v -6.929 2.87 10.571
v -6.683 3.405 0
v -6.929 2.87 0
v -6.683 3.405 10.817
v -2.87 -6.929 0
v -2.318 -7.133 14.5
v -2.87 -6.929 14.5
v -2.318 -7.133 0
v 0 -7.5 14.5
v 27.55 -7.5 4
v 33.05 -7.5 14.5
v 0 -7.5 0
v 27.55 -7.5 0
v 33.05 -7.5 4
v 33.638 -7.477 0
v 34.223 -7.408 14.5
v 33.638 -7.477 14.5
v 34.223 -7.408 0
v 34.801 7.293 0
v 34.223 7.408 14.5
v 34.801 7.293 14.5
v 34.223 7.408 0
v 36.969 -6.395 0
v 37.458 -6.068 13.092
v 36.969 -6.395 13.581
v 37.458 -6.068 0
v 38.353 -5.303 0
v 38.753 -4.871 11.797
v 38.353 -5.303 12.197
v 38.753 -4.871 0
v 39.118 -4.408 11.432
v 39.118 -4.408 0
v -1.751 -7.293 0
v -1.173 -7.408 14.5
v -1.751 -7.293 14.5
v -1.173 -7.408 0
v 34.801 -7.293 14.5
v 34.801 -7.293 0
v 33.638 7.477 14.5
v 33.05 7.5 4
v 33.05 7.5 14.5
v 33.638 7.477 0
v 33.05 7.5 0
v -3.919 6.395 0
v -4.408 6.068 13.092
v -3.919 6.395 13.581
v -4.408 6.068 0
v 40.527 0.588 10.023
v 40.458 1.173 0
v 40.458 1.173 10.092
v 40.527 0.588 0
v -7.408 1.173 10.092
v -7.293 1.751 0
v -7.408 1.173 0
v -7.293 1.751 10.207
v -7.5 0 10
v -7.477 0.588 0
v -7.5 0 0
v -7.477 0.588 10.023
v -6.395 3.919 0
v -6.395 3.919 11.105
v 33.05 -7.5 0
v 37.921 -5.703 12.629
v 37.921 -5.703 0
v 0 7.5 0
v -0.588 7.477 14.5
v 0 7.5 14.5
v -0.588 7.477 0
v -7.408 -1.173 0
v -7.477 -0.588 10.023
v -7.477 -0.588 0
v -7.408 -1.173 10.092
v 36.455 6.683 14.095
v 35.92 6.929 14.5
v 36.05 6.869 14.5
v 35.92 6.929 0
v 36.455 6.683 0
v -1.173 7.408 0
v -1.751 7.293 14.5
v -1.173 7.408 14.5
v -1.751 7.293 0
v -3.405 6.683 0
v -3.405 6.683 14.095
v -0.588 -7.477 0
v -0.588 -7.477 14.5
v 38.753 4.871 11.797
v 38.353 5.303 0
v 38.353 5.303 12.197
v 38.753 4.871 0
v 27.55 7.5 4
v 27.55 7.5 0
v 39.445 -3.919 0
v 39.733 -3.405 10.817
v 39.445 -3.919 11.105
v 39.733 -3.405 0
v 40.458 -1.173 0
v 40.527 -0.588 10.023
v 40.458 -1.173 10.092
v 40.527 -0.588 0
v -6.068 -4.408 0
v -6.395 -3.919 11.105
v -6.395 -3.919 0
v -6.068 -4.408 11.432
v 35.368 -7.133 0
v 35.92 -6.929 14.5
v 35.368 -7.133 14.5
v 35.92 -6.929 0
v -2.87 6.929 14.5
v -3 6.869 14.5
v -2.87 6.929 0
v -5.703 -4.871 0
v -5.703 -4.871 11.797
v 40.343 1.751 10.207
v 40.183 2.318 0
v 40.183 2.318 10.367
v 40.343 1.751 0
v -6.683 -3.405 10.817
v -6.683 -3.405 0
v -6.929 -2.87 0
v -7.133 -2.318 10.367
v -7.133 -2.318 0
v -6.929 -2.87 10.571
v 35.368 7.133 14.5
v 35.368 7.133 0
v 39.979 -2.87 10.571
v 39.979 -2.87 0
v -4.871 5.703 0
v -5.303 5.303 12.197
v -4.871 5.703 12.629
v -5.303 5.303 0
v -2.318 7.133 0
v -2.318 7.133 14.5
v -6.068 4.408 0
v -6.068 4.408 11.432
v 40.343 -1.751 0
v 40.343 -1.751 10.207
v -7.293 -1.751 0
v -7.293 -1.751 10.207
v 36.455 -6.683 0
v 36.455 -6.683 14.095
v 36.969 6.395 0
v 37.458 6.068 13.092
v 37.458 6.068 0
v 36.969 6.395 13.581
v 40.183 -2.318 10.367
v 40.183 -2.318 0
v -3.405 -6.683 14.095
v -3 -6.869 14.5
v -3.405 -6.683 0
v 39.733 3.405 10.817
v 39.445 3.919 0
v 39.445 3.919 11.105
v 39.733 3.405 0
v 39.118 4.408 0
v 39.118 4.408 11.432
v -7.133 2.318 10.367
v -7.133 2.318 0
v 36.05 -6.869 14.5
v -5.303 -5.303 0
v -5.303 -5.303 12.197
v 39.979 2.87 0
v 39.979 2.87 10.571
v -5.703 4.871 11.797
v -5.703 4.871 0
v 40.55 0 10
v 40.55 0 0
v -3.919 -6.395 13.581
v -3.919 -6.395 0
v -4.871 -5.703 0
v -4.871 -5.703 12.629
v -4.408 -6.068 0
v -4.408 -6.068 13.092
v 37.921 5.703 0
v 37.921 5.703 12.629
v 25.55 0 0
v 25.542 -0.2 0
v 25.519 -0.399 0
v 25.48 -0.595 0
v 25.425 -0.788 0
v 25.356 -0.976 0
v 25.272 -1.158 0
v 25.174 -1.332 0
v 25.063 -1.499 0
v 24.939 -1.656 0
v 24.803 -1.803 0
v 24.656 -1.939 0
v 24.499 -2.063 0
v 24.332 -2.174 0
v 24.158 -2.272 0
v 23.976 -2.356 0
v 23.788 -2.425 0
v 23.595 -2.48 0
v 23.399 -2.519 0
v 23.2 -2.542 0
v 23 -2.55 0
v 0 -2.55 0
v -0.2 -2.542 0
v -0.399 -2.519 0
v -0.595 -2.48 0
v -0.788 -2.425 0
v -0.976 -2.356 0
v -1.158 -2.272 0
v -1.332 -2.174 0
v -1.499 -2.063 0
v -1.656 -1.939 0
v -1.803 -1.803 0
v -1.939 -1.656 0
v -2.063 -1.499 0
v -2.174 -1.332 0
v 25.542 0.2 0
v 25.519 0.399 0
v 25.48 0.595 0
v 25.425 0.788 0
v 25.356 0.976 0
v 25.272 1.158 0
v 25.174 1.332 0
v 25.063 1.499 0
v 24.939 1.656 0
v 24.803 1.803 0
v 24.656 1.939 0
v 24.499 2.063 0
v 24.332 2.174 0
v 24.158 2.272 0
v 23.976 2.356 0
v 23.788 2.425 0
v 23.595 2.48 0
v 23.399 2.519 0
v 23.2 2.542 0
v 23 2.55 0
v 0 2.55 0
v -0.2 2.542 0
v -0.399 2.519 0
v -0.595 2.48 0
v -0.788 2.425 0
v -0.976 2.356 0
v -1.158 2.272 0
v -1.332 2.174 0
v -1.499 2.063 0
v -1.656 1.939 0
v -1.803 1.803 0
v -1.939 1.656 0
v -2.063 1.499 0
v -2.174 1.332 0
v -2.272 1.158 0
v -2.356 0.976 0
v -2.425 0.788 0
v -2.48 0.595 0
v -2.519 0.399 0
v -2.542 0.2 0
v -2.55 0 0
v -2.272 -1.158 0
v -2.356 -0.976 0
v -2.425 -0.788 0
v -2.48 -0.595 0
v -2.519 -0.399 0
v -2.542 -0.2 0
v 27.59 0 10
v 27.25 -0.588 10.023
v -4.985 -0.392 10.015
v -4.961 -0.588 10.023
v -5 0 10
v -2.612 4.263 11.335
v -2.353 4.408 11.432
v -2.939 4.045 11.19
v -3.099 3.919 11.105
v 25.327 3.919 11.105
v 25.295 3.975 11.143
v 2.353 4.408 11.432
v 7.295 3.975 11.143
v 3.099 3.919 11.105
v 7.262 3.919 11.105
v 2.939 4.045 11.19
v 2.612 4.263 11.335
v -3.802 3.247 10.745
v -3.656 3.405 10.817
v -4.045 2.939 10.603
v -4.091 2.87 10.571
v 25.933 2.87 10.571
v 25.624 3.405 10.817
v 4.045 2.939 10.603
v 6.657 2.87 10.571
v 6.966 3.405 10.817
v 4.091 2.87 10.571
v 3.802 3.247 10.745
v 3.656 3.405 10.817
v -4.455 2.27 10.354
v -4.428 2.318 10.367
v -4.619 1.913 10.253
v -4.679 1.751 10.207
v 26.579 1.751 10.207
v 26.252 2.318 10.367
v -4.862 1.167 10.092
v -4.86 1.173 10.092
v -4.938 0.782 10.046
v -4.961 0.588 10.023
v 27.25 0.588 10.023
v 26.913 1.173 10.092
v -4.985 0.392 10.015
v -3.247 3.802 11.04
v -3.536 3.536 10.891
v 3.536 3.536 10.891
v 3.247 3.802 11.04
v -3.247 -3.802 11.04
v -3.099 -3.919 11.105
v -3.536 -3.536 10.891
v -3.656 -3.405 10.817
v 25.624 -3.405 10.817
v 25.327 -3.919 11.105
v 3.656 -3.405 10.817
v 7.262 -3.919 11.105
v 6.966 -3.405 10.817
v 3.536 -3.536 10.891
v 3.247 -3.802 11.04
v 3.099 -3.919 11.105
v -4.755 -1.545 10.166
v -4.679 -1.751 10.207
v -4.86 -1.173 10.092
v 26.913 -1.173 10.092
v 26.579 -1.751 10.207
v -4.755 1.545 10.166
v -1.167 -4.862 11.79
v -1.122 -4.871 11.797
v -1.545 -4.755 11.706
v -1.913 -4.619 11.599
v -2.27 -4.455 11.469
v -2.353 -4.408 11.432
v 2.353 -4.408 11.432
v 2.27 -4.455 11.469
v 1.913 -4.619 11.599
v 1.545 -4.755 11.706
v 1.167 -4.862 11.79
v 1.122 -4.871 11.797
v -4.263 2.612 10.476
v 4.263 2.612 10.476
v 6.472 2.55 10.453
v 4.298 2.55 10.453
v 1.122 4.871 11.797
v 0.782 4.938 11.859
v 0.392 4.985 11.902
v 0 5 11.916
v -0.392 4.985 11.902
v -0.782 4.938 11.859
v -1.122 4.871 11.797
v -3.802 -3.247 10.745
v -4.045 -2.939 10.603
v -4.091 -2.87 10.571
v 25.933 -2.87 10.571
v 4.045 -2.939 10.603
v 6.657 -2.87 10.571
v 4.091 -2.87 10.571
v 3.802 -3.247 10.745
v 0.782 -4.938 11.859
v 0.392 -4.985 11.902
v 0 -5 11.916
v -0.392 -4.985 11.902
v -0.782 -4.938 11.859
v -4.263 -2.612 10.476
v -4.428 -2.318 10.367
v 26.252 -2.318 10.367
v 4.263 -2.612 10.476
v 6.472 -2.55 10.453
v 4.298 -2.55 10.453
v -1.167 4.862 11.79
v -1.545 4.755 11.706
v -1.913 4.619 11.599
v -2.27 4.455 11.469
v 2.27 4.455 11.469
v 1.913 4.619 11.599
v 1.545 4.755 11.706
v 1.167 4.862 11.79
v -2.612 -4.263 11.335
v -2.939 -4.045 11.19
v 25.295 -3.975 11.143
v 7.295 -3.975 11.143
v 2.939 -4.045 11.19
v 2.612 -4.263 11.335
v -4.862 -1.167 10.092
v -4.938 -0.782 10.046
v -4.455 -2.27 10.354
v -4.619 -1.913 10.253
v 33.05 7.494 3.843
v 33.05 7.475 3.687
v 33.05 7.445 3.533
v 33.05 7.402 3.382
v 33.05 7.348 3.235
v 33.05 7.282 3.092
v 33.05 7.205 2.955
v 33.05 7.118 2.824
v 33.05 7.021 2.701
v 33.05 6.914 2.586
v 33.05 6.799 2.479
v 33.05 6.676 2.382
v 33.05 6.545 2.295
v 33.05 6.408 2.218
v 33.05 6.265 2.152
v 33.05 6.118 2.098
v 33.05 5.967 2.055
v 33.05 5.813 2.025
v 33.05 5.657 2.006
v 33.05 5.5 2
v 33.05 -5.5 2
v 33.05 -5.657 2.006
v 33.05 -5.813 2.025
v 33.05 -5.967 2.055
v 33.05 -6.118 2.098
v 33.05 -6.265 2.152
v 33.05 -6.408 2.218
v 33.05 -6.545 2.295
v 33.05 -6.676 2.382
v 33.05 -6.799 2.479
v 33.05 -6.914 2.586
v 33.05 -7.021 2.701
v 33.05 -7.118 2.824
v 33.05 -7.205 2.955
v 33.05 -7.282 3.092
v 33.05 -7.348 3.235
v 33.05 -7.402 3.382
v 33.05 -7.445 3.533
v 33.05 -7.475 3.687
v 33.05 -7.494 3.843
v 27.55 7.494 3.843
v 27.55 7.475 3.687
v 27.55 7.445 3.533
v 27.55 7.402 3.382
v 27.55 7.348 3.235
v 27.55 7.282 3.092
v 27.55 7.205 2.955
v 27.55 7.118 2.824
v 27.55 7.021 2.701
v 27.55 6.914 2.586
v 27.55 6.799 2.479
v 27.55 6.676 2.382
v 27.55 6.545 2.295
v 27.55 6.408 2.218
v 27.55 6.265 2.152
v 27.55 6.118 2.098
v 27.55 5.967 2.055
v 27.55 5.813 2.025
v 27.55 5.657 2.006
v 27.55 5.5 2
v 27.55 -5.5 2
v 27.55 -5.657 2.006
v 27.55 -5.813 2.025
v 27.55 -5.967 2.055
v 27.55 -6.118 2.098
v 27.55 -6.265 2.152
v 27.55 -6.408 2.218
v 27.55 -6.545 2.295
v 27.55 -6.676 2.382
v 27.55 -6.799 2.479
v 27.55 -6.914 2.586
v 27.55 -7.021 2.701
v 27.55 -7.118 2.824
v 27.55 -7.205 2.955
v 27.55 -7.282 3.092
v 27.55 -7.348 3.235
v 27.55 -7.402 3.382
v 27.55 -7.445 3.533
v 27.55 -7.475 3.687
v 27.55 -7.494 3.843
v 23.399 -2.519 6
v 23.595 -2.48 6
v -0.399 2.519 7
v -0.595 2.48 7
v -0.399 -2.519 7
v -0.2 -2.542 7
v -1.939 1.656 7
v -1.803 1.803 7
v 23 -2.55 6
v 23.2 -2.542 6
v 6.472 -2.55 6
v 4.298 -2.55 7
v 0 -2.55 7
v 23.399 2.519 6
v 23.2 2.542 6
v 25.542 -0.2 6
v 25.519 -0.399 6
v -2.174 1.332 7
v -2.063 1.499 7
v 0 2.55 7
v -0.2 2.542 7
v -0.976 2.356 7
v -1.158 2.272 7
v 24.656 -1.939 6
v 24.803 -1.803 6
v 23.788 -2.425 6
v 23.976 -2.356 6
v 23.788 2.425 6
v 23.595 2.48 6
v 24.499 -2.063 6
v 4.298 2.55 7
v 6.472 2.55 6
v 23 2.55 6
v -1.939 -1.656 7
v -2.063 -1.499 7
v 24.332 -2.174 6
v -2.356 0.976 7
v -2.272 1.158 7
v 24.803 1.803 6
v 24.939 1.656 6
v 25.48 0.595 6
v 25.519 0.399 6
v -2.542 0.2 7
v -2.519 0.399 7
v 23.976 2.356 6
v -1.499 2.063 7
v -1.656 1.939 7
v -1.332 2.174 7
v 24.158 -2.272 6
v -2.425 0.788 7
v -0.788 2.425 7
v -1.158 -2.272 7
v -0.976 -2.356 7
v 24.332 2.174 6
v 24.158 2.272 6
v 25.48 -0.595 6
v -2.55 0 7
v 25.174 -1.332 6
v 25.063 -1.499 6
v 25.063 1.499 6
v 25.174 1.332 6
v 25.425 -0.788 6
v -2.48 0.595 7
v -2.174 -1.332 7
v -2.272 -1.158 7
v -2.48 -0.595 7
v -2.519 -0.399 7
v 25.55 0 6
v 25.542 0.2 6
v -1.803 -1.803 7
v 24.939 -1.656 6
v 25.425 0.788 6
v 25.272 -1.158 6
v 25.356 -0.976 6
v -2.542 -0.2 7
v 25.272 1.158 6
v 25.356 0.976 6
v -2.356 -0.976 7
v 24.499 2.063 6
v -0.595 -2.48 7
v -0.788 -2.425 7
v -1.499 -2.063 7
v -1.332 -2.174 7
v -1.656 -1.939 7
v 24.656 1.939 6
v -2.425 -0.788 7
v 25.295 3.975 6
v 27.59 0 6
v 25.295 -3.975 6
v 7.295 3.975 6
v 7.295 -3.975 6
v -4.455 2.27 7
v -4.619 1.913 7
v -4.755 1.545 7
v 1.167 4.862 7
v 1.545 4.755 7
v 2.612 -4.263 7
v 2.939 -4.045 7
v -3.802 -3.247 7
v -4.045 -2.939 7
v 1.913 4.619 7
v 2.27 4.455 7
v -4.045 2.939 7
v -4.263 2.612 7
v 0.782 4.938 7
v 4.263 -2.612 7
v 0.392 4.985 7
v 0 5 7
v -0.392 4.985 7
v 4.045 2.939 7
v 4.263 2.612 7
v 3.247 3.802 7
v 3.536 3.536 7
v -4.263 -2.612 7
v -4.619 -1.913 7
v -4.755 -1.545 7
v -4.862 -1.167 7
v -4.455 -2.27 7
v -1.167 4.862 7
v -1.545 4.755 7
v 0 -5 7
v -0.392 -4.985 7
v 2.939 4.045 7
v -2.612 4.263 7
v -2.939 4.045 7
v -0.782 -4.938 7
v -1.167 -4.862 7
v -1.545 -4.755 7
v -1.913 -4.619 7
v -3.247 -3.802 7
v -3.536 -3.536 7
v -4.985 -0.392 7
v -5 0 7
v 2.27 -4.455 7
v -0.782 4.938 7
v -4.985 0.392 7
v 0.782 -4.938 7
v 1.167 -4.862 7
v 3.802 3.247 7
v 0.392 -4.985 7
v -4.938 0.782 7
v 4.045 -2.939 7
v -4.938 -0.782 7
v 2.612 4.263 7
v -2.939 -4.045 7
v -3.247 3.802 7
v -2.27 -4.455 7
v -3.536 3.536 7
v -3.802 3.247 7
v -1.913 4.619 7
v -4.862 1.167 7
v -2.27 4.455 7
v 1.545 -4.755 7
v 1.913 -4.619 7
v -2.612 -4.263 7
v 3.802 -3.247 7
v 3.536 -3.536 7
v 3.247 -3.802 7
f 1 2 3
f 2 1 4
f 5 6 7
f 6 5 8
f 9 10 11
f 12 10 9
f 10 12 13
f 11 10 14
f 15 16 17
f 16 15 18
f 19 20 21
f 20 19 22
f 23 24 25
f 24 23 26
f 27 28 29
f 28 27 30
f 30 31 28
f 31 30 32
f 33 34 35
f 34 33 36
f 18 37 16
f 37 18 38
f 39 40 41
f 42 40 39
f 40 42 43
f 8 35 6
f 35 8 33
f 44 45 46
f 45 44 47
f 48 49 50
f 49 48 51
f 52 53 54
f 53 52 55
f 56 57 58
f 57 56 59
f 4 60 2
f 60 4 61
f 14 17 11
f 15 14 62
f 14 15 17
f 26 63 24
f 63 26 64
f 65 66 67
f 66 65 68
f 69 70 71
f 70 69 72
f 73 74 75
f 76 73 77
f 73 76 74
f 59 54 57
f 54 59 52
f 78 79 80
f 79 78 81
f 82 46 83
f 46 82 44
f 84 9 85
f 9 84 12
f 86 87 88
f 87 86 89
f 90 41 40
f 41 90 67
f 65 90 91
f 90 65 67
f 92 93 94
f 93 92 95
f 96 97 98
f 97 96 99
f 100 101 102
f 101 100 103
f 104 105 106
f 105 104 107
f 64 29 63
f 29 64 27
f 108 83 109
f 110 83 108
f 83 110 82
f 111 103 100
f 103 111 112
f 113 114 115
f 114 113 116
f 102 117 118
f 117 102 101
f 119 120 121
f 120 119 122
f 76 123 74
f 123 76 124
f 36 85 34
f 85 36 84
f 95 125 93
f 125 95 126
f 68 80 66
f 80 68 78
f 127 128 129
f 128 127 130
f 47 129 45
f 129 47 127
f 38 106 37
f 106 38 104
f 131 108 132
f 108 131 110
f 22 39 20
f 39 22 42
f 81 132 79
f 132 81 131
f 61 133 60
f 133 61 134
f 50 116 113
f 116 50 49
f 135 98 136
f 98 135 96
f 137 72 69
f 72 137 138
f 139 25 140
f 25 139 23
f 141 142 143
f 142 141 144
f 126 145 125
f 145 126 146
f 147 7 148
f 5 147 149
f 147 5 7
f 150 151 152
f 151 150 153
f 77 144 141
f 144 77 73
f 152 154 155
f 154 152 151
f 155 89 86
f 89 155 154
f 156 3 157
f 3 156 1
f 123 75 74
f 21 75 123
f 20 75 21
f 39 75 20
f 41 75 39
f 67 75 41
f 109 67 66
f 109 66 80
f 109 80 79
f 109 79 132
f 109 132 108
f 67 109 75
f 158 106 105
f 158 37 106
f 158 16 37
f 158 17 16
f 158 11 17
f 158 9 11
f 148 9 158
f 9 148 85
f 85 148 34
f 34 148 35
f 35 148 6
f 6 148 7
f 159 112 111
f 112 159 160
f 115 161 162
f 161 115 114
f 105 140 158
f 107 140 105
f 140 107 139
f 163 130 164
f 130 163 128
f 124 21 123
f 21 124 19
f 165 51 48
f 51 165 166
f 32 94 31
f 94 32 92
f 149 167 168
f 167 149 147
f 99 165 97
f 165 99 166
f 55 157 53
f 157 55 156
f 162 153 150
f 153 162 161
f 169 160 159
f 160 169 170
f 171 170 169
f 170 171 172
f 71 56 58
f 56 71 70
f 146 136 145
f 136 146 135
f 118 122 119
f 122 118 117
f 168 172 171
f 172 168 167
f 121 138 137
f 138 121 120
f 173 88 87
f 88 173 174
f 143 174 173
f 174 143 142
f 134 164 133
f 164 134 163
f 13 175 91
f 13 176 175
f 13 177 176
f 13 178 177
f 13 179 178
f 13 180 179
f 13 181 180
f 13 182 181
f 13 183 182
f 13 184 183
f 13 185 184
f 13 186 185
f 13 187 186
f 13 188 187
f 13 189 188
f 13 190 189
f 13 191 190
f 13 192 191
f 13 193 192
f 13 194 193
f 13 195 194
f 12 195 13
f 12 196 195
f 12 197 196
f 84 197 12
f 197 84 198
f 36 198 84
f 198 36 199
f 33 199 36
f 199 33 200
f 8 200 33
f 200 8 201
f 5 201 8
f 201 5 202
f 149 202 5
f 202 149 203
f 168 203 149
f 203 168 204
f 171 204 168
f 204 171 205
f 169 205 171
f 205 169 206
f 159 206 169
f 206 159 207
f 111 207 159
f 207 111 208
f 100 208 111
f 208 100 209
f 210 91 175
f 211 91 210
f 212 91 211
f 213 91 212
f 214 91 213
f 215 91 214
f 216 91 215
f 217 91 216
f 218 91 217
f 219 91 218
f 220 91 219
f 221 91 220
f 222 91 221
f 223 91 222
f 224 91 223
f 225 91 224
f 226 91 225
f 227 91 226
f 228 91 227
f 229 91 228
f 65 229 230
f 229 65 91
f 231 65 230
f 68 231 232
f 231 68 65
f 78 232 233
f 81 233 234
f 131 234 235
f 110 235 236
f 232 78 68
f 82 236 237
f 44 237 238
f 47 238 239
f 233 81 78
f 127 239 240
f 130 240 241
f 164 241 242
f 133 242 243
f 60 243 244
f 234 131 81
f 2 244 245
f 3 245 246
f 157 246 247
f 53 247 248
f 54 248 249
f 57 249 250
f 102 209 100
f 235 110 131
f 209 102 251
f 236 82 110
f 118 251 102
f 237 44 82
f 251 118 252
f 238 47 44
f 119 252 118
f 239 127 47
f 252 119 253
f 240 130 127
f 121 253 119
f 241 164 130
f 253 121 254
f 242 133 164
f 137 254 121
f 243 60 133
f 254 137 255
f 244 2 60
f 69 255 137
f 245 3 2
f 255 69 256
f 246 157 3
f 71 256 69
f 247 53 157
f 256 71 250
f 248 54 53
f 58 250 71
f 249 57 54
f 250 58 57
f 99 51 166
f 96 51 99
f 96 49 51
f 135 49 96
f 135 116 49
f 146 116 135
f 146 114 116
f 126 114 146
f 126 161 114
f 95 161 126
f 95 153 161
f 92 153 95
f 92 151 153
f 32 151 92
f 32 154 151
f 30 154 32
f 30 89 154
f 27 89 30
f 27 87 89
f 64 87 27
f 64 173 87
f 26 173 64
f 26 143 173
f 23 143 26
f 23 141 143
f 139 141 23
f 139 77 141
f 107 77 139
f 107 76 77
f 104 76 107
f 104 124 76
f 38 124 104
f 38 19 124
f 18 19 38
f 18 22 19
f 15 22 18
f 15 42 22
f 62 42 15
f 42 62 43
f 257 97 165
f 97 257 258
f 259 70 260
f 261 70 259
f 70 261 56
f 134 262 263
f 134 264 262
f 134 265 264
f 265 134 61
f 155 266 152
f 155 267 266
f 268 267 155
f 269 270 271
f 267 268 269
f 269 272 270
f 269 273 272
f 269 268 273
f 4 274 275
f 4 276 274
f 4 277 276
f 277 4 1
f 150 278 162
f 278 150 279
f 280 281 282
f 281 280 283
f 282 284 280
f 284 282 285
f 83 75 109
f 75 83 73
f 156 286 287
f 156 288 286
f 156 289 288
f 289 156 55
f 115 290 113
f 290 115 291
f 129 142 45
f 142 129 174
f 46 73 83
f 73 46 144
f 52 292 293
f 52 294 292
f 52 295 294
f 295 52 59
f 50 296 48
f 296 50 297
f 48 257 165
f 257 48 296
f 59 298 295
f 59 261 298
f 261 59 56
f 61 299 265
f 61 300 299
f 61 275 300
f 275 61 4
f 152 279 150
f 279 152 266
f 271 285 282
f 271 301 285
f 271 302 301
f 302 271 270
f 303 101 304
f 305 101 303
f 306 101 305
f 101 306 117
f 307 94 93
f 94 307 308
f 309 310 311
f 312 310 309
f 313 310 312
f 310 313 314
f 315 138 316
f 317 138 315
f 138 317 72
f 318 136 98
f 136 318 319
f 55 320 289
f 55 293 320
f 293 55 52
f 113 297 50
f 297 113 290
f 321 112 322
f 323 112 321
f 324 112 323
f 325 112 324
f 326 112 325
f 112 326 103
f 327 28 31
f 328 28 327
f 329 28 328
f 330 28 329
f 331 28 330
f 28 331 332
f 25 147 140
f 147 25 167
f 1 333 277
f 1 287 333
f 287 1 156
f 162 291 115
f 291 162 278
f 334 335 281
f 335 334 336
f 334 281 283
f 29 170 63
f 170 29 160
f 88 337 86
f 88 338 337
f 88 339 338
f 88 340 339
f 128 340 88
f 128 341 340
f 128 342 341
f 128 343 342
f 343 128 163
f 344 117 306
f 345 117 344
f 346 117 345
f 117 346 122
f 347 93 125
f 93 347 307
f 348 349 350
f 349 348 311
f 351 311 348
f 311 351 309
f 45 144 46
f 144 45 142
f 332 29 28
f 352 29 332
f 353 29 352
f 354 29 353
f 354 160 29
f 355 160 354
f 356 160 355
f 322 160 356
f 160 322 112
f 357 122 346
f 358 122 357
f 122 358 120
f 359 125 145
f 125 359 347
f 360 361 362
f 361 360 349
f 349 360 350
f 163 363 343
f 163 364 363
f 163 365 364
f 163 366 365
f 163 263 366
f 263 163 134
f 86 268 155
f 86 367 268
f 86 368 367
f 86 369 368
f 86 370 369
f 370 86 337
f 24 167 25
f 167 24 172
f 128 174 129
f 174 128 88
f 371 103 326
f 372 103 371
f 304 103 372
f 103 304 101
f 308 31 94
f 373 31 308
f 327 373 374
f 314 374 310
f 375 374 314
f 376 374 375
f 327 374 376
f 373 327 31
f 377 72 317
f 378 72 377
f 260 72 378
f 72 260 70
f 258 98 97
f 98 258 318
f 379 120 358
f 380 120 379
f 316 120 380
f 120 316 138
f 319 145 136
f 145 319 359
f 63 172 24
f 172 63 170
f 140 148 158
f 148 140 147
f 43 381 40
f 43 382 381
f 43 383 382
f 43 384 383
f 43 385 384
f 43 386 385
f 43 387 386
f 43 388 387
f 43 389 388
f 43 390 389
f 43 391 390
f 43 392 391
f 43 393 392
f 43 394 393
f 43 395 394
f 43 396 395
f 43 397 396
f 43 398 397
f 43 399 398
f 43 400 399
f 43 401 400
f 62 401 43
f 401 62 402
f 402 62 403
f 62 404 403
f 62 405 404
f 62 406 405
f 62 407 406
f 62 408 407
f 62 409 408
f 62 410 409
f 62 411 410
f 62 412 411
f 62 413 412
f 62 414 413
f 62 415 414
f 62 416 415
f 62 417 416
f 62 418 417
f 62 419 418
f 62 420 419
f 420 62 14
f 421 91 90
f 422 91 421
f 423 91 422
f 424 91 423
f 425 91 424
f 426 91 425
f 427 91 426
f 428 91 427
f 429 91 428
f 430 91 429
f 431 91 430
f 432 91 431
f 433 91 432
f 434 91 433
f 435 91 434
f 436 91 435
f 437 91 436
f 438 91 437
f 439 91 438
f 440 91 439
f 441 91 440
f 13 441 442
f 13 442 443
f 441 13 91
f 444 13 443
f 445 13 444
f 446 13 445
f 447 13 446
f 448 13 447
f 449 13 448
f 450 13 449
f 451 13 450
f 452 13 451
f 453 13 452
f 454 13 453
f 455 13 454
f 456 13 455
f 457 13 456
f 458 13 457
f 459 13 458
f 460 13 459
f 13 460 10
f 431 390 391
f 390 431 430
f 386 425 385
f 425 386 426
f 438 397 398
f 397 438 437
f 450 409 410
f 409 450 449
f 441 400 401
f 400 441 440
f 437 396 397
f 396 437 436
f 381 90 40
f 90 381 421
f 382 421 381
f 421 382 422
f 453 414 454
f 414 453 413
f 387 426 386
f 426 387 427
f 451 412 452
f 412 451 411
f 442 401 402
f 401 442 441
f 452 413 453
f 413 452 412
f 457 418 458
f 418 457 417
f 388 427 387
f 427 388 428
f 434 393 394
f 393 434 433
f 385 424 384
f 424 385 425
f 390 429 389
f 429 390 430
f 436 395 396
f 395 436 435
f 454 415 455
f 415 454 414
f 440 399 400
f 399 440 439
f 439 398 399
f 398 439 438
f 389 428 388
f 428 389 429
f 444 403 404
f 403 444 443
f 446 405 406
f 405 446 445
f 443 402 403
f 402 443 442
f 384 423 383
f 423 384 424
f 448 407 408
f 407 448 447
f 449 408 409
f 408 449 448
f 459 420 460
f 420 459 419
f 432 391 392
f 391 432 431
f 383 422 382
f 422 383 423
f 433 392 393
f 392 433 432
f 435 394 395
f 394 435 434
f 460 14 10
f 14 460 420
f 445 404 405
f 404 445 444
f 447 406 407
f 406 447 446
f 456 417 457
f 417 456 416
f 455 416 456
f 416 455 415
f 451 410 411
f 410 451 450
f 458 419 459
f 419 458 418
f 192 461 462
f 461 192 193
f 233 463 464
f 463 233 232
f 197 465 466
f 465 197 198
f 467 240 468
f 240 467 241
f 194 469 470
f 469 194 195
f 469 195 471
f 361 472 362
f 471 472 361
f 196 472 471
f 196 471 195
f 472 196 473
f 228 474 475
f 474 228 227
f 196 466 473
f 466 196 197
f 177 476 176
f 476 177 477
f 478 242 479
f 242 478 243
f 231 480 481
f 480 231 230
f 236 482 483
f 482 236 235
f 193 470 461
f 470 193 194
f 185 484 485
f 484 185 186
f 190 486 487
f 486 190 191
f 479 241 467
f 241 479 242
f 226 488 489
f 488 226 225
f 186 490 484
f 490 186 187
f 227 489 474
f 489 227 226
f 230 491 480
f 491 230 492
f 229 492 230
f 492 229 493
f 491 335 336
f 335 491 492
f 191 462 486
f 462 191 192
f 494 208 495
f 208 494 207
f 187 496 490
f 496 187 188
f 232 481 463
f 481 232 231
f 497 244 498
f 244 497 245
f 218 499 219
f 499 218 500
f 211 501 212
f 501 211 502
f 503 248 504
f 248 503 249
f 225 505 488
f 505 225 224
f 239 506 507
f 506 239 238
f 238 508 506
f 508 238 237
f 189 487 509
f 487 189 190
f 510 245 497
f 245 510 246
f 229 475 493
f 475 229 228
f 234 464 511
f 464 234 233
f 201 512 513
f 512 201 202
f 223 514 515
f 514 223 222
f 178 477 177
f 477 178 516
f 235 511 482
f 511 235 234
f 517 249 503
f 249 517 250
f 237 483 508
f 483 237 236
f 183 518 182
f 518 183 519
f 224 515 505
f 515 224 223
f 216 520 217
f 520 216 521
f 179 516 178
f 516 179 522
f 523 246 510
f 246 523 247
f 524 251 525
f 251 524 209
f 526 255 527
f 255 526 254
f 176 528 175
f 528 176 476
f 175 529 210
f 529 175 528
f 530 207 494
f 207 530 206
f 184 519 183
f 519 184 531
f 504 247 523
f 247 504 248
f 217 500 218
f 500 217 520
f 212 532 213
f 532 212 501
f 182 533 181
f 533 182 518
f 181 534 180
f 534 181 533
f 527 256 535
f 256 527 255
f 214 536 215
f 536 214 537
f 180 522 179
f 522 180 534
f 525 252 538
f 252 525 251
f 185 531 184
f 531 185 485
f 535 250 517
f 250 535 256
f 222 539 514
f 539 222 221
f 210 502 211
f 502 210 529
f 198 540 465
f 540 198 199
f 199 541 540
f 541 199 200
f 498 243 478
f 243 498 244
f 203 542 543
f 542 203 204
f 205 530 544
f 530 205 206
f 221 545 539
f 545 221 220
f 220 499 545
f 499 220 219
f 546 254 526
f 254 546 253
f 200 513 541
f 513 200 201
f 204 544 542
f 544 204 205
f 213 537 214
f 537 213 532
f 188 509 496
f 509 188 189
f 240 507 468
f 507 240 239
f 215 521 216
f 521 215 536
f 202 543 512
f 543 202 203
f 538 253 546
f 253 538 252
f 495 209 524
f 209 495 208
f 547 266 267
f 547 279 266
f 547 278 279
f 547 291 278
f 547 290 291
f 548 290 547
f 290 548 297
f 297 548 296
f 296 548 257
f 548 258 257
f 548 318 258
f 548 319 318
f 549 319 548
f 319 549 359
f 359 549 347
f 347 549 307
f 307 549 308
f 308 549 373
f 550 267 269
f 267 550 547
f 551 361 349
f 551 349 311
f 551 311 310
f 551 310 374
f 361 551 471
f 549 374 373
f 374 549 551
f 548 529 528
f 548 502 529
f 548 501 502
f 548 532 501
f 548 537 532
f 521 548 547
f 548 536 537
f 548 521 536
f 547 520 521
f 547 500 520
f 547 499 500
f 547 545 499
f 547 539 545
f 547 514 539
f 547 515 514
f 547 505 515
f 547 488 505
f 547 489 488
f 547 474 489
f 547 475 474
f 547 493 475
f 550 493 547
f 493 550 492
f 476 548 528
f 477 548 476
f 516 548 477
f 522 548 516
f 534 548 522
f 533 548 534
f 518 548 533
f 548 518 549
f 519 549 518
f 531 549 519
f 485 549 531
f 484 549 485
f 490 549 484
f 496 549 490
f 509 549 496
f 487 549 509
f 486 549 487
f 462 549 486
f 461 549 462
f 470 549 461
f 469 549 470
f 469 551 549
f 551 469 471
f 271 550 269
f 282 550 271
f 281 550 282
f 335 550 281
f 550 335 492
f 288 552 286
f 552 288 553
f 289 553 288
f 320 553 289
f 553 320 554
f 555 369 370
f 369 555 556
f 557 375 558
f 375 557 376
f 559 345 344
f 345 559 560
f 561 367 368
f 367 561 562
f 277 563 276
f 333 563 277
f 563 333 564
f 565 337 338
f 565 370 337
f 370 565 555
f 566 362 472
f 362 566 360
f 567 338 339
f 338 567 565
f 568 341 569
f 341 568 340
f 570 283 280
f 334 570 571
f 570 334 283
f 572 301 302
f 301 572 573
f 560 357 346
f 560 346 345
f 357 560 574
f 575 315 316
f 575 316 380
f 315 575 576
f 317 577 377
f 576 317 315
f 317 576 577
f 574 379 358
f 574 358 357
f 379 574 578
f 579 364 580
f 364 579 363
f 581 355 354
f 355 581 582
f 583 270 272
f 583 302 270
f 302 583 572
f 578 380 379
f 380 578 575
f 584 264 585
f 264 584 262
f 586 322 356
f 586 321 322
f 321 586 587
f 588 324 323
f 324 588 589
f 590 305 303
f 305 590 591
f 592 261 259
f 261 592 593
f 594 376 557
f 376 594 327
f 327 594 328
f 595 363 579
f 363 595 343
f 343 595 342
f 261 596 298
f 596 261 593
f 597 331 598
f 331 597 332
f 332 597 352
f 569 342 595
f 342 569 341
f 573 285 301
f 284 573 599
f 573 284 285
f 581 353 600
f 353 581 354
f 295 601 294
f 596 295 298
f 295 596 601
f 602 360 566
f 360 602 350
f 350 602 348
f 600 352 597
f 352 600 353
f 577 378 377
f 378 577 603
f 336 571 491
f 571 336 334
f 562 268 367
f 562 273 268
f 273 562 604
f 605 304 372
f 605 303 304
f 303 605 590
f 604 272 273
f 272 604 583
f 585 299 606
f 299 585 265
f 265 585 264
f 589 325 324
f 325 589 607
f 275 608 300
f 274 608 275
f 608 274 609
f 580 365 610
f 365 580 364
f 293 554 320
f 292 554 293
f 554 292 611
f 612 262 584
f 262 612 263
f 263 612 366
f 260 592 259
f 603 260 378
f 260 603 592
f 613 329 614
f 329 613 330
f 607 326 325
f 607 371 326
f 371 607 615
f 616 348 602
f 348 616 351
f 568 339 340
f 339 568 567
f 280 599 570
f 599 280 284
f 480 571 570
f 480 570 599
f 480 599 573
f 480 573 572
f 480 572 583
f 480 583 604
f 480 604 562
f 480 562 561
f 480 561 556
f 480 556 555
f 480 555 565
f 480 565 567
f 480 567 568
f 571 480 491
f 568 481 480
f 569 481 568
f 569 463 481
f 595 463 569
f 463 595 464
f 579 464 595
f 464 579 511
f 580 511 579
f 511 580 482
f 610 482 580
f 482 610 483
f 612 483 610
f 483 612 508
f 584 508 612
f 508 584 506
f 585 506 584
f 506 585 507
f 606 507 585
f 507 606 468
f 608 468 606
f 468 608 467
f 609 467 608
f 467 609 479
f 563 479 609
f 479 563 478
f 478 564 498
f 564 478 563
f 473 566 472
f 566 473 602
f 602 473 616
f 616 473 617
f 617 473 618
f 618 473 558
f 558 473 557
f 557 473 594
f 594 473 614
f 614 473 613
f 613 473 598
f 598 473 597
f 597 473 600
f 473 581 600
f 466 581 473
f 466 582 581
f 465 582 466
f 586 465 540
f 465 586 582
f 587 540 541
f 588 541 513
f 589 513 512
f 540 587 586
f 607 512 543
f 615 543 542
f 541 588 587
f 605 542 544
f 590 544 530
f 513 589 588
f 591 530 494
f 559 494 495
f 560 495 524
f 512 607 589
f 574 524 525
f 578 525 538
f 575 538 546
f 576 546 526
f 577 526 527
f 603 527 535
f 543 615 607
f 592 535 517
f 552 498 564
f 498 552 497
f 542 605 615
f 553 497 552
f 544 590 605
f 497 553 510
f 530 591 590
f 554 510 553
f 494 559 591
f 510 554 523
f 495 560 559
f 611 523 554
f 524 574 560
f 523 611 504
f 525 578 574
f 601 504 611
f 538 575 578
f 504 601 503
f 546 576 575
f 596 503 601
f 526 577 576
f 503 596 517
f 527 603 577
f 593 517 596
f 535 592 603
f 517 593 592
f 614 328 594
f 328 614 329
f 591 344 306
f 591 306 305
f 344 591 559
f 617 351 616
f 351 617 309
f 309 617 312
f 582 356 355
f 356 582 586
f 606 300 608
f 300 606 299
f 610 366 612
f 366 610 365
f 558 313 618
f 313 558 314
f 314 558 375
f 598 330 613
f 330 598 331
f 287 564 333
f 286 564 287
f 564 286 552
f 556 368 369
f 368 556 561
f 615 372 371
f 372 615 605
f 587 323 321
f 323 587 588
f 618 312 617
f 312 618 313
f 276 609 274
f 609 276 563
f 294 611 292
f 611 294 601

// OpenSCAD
frameOffsetHeight = 10; //Distance between the frame pipe and the lock
framePipeDiameter = 15; //Diameter of the frame pipe

notchDiameter = 10; // Notch diameter. 0 to disable
notchHeight = 3; // Height of the notch (shortest distance to the pipe)

recessCenterLength = 23; //The length of the recess
recessThreadWidth = 5.1; //The thread width of the bolt (+tolerance)
recessHeadWidth = 7.95; //Shortest width of the hex bolt head
recessHeadHeight = 4; //hex bolt head height

tieWrapWidth = 5.5; //Width of the gutter(s) for the tiewrap(s)
tieWrapHeight = 2; //Height of the gutter(s) for the tiewrap(s)

render() {
    $fn=80;
    difference() {
        baseBlock();
        recess();
        if(useNotch()) {
            notch();
        }
    }
}

function useNotch() = notchDiameter > 0 && notchHeight > 0;

module notch() {
    translate([0,0,frameBorderOffset()-notchHeight])
    cylinder(h=calculateBaseHeight(), d=notchDiameter);
}

module recess() {
    module recessThread() {
        cylinder(h=calculateBaseHeight(),d=recessThreadWidth);
    }

    function calculateHeadDiameter() = recessHeadWidth / sqrt(3) * 2;
    
    module recessHead() {
        translate([0,0,frameBorderOffset()-recessHeadHeight]) 
            cylinder(h=calculateBaseHeight(), d=calculateHeadDiameter(), $fn=6);
    }
    
    hull() {
        recessThread();
        translate([recessCenterLength, 0, 0]) recessThread();
    }
    
    hull() {
        translate([useNotch() ? notchDiameter/2 + calculateHeadDiameter() /2 : 0,0,0]) recessHead();
        translate([recessCenterLength, 0, 0]) recessHead();
    }
}

module baseBlock() {
    module baseCylinder() {
        cylinder(h=calculateBaseHeight()-framePipeDiameter/5, d=framePipeDiameter);
    }
    
    tieWrapMargin=2;
    
    module tieWrapGutter() {
        translate([recessThreadWidth/2 + tieWrapMargin,-framePipeDiameter/2,0])
            difference() {
                cube([tieWrapWidth, framePipeDiameter+2, tieWrapHeight * 2]);
                hull() {
                    translate([0,tieWrapHeight,tieWrapHeight * 2]) rotate([0,90,0]) cylinder(h=tieWrapWidth, r=tieWrapHeight);
                    translate([0,framePipeDiameter-tieWrapHeight,tieWrapHeight * 2]) rotate([0,90,0]) cylinder(h=tieWrapWidth, r=tieWrapHeight);
                }
            }
    }
    
    function tieWrapExtraLength() = recessThreadWidth/2 + tieWrapWidth + tieWrapMargin;
    
    function baseCenterLength() = recessCenterLength + (tieWrapExtraLength() * (useNotch() ? 1 : 2));
    
    difference() {
        translate([(useNotch() ? 0 : -tieWrapExtraLength()),0,0])
            difference() {
                hull() {
                    baseCylinder();
                    translate([baseCenterLength(), 0, 0])
                        baseCylinder();
                }

                translate([-framePipeDiameter/2, 0, calculateBaseHeight()]) 
                    rotate([0,90,0])
                        cylinder(h=baseCenterLength()+framePipeDiameter, d=framePipeDiameter);
            }
    
        translate([recessCenterLength,0,0]) tieWrapGutter();
        if(!useNotch()) {
            rotate([0,0,180]) tieWrapGutter();
        }
    }
}

function frameBorderOffset() = calculateBaseHeight()-(framePipeDiameter/2);


function calculateBaseHeight() = framePipeDiameter/2+frameOffsetHeight;
